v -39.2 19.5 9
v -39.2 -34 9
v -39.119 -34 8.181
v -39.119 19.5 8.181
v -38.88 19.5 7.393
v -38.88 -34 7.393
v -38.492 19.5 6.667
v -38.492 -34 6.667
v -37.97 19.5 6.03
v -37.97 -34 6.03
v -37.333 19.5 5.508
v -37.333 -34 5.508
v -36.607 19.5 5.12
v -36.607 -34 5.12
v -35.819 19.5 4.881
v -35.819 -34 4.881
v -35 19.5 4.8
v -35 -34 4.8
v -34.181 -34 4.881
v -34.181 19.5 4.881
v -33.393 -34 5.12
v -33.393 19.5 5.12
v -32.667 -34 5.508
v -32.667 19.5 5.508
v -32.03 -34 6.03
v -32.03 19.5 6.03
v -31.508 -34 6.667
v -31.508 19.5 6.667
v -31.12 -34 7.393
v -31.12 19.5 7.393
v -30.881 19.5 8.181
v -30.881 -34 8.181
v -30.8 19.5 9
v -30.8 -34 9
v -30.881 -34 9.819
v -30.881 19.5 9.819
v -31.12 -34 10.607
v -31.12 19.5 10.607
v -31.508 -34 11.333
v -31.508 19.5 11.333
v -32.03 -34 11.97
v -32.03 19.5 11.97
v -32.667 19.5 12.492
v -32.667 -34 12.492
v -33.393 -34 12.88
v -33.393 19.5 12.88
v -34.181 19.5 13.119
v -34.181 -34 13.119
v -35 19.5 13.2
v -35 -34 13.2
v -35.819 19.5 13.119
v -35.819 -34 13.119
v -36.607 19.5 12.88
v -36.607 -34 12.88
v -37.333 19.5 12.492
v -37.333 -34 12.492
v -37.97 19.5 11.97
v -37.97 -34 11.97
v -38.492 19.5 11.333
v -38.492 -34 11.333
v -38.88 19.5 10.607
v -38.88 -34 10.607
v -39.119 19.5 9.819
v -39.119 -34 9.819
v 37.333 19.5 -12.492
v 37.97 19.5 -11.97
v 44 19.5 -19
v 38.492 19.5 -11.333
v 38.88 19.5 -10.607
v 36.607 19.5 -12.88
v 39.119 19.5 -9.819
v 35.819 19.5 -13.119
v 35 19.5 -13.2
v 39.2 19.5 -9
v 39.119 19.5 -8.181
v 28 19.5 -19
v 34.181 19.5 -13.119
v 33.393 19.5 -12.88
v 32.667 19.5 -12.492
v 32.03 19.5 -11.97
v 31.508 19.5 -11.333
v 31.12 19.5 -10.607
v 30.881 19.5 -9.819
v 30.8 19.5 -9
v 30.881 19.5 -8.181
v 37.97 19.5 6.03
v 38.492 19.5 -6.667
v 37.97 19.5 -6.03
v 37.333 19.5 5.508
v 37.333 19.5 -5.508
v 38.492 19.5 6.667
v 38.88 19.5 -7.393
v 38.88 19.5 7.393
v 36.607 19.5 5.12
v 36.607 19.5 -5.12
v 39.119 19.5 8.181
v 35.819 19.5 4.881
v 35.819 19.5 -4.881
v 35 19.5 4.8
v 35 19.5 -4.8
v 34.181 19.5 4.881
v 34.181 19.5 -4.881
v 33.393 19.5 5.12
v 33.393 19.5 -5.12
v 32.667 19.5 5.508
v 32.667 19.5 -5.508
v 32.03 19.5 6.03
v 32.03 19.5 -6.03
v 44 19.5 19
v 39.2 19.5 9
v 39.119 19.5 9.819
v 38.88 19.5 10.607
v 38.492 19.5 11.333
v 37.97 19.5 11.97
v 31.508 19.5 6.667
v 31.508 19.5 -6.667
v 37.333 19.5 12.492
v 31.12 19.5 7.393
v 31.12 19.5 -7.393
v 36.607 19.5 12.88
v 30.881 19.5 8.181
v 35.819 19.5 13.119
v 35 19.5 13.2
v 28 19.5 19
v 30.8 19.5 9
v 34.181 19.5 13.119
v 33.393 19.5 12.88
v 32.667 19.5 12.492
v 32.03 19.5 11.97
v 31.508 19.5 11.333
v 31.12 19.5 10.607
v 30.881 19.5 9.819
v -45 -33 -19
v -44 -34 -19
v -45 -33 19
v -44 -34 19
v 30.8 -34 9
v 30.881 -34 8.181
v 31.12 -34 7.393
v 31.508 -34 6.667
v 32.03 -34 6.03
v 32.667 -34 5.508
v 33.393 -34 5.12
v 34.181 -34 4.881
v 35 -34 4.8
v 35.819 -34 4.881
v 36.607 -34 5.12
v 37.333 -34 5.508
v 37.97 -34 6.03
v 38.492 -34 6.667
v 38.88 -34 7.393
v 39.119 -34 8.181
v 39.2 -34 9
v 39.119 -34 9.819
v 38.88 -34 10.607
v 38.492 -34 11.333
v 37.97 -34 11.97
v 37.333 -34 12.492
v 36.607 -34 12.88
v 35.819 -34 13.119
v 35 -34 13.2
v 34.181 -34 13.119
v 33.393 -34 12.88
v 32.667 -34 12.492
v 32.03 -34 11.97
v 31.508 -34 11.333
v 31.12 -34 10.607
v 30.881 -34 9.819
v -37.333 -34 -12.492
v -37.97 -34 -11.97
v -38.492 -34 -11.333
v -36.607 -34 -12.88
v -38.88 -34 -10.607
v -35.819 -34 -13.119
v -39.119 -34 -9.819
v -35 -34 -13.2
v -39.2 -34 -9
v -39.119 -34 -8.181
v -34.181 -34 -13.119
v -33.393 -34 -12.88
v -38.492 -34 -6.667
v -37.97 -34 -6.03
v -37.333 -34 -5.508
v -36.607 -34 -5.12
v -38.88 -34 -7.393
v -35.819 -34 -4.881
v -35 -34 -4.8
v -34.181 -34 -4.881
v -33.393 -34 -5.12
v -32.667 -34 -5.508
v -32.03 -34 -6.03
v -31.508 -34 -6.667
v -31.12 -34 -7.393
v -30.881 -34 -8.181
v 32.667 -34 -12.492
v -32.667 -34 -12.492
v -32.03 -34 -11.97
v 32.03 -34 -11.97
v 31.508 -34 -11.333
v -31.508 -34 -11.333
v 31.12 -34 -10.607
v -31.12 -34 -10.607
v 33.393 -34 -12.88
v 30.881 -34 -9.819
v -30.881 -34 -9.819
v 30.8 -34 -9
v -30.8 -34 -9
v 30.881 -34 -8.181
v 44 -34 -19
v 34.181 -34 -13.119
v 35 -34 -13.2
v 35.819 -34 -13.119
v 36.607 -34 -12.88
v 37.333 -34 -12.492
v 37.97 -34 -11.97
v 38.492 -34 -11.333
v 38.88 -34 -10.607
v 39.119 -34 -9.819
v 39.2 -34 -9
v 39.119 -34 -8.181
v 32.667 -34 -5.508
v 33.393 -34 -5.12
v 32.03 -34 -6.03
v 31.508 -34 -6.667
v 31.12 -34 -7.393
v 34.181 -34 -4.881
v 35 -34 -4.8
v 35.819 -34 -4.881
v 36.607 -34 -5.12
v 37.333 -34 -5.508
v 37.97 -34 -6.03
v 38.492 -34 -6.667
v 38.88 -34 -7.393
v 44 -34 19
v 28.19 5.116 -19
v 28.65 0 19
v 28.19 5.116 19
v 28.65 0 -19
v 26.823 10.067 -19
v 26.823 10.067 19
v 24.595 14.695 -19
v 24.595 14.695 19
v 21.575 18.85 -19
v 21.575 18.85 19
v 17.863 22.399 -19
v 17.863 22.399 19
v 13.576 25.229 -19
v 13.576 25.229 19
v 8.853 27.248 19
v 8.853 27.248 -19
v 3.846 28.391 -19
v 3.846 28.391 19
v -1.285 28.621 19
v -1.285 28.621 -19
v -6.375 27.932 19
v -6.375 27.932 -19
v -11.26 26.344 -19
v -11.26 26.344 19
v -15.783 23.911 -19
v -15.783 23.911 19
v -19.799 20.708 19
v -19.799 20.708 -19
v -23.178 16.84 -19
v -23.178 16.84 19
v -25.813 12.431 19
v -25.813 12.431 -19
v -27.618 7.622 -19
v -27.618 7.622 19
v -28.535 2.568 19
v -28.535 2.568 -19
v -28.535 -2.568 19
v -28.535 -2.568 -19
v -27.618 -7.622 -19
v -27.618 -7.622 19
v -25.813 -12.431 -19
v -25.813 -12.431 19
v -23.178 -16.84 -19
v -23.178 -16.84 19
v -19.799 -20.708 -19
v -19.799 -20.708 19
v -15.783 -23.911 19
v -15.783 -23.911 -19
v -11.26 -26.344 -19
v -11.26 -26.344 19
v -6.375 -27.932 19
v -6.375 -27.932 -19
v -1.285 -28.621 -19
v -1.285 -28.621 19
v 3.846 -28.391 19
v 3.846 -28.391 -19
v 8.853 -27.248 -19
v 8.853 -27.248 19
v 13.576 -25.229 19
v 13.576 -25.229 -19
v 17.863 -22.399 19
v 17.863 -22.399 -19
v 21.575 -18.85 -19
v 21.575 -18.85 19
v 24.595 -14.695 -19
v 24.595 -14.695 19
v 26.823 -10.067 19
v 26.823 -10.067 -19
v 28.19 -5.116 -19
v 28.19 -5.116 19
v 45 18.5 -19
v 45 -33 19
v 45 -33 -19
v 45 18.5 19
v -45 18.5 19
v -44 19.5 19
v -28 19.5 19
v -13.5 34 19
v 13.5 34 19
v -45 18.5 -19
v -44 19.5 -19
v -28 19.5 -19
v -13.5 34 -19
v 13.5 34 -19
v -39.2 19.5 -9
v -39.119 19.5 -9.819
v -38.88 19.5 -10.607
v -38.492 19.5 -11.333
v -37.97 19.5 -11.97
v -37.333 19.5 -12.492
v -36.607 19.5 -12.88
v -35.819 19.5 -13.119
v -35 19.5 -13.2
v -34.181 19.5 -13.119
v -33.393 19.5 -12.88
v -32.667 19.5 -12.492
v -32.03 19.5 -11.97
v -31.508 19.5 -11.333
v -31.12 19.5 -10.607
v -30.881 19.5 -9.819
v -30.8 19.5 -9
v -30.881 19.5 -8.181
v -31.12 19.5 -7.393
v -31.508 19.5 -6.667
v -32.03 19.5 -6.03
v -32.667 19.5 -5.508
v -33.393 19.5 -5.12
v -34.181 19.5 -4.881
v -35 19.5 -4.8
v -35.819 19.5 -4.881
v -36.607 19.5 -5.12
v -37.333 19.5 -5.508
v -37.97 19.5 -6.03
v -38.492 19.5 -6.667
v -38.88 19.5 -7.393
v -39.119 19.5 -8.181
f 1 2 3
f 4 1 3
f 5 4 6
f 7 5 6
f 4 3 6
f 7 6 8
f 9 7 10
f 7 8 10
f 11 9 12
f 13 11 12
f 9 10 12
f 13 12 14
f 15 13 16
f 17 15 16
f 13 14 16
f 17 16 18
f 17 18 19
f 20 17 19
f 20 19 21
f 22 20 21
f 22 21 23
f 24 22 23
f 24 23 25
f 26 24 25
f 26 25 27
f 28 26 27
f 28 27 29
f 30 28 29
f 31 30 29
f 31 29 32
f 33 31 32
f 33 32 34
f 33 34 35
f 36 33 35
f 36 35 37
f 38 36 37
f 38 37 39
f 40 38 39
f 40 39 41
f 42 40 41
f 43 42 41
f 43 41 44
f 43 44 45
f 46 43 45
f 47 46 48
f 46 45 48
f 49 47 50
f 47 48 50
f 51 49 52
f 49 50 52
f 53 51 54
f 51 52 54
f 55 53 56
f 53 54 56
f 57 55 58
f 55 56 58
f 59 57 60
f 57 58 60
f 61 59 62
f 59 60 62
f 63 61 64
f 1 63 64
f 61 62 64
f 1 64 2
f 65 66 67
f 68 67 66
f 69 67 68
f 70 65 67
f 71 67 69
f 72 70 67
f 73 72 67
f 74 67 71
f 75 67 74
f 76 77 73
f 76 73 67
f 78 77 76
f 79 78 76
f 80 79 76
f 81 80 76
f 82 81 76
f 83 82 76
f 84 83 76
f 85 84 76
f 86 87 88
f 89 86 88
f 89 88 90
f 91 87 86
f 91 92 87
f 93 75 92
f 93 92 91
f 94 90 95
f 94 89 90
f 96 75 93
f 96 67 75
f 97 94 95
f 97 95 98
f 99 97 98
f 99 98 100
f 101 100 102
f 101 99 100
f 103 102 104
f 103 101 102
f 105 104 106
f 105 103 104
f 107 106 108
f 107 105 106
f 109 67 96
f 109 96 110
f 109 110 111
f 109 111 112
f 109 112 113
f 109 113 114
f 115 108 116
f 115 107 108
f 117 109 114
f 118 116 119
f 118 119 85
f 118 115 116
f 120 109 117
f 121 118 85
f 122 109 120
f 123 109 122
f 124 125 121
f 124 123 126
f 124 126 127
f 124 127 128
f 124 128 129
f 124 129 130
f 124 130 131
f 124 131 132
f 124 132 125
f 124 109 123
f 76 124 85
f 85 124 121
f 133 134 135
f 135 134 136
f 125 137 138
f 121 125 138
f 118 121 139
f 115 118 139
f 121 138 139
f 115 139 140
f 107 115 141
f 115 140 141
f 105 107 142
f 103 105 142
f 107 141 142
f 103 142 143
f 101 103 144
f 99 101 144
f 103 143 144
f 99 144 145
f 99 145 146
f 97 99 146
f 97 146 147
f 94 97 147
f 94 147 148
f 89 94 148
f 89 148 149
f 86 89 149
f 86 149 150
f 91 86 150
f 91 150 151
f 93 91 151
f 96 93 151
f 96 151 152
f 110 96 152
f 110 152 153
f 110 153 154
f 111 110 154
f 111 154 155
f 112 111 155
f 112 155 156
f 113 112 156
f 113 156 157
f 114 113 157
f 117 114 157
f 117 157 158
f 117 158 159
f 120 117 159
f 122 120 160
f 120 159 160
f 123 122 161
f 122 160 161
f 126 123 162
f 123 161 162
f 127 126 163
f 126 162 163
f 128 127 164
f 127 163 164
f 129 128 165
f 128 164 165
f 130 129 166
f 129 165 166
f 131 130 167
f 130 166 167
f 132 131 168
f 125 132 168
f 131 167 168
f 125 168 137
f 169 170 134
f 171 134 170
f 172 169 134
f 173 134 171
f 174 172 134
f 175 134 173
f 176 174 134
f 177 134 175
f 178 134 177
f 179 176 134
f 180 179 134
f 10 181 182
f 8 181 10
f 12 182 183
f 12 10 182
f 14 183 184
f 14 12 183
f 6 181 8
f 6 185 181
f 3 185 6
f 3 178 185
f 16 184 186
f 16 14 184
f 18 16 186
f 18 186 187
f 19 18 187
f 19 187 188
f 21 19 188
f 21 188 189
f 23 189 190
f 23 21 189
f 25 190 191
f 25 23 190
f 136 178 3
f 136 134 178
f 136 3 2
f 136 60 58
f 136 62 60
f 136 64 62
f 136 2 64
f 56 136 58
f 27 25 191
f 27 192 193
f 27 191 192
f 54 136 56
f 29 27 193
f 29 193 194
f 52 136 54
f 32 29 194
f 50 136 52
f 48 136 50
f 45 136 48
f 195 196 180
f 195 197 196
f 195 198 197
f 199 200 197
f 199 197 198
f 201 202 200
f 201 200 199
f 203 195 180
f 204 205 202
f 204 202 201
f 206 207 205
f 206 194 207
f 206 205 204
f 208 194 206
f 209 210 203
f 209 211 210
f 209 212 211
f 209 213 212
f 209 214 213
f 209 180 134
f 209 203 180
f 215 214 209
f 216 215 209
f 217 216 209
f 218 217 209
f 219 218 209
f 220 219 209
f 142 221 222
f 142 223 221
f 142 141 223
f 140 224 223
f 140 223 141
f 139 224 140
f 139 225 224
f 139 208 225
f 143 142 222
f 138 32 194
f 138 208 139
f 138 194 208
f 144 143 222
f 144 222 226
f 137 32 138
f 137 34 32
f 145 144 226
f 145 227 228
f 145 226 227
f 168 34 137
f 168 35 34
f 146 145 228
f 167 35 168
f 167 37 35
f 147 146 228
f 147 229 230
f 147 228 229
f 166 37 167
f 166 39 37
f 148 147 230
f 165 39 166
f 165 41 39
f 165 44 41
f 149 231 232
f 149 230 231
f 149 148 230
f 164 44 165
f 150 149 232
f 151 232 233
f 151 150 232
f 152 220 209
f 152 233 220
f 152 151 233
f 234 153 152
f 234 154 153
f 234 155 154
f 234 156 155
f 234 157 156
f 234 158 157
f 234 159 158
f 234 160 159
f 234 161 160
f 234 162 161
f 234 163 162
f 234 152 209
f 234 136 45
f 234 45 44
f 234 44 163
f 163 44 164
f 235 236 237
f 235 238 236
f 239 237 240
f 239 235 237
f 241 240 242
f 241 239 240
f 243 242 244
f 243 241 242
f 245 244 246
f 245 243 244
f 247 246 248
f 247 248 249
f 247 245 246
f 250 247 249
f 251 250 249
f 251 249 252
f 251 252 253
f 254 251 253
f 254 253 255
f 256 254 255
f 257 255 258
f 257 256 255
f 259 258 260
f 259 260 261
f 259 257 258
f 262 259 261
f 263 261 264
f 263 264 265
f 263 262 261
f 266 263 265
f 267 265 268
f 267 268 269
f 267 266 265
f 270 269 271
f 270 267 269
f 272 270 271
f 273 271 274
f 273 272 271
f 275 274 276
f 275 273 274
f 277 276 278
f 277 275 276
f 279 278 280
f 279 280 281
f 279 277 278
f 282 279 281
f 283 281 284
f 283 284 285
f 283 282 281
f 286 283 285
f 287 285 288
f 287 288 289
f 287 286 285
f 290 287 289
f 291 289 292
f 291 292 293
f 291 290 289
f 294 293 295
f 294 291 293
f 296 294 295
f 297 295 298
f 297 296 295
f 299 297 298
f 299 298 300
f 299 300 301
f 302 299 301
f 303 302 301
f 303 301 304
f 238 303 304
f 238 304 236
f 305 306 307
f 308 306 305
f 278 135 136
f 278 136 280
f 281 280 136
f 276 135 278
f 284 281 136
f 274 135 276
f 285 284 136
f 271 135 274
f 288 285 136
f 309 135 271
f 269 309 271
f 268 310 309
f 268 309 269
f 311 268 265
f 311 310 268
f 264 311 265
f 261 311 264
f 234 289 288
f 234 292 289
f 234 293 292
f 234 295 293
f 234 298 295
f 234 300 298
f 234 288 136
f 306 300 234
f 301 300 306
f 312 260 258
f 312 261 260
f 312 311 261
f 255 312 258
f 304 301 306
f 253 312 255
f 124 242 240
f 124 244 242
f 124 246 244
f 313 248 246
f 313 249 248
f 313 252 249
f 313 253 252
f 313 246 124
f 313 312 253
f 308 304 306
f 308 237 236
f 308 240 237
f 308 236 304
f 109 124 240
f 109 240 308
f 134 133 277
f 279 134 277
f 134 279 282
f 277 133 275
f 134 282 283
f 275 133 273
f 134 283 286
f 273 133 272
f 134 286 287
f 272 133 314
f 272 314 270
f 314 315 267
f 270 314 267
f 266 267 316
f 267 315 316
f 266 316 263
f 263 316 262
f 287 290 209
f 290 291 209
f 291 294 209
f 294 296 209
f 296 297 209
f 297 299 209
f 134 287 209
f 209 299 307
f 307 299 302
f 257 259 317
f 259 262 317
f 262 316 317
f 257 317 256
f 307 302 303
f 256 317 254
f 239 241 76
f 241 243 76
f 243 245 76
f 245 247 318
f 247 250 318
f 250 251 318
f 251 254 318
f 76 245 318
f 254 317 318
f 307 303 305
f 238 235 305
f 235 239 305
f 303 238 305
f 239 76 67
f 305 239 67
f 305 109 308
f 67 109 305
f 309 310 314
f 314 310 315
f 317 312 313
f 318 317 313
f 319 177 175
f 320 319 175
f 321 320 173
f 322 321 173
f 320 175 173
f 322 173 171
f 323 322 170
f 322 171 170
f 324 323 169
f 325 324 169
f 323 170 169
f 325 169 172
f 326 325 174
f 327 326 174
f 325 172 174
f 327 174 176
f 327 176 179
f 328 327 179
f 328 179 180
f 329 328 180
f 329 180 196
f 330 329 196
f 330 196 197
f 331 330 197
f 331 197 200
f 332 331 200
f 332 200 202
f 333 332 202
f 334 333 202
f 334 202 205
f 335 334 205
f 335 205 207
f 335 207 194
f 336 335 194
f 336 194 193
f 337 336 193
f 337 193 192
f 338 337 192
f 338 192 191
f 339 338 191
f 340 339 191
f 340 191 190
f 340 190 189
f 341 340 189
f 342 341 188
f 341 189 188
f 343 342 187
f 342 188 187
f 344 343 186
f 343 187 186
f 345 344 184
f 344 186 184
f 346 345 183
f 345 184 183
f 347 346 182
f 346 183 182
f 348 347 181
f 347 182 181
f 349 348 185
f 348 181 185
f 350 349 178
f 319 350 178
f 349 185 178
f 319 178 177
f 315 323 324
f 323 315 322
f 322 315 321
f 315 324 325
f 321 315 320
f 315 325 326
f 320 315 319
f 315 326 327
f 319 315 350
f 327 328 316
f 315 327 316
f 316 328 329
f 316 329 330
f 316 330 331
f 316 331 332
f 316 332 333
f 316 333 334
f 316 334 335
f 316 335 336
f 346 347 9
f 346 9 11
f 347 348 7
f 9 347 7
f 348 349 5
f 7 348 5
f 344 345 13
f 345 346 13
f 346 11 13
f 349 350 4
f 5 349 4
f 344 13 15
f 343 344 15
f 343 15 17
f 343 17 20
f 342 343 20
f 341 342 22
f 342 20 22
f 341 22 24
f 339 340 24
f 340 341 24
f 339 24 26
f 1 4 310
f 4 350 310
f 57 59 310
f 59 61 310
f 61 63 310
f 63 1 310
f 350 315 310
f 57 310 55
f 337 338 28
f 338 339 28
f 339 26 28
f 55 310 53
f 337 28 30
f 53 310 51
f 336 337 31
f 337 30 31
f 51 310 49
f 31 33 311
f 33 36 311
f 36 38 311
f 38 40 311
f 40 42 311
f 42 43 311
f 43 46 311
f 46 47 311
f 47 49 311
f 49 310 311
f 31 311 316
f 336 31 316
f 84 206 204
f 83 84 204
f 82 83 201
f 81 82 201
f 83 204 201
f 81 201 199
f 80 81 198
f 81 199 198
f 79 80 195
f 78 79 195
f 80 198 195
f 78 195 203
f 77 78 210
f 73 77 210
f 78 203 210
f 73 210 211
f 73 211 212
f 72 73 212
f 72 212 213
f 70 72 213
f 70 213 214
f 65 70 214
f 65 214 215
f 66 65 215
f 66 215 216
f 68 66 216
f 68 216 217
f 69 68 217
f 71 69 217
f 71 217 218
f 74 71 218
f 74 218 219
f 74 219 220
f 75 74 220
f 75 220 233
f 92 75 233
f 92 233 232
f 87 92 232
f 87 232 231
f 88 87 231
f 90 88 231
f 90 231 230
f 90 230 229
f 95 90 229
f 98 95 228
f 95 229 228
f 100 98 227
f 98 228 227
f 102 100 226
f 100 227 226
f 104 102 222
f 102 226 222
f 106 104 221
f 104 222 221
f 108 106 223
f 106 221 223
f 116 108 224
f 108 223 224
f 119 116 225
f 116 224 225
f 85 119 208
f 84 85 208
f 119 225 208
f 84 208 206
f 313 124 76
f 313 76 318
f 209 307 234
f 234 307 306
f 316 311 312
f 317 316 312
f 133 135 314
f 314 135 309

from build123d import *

# Parameters (mm, degrees)
SKETCH1_W            = 90
SKETCH1_H            = 68
SKETCH1_R            = 28.65
BOSS_EXTRUDE1_DEPTH  = 19
M8_CLEARANCE_HOLE1_D = 8.4
CUT_EXTRUDE2_DEPTH   = 39
CHAMFER1_SIZE        = 1


with BuildPart() as part:
    # Sketch1 → Boss-Extrude1 (new body, symmetric)
    with BuildSketch(Plane.XY):
        Rectangle(SKETCH1_W, SKETCH1_H)
        Circle(SKETCH1_R, mode=Mode.SUBTRACT)
    extrude(amount=BOSS_EXTRUDE1_DEPTH, both=True)

    # M8 Clearance Hole1 (through all)
    with Locations(Plane(origin=(0, 34, 0), x_dir=(1, 0, 0), z_dir=(0, 1, 0))):
        with Locations((-35, 9), (-35, -9), (35, -9), (35, 9)):
            Hole(M8_CLEARANCE_HOLE1_D / 2)

    # Sketch3 → Cut-Extrude2 (cut, through all)
    with BuildSketch(Plane.XY.offset(19)):
        Polygon((-45, 19.5), (-28, 19.5), (-13.5, 34), (-45, 34), align=None)
        Polygon((45, 19.5), (28, 19.5), (13.5, 34), (45, 34), align=None)
    extrude(amount=-CUT_EXTRUDE2_DEPTH, mode=Mode.SUBTRACT)

    # Chamfer1
    chamfer1_edges = [part.edges().sort_by_distance(p)[0] for p in [
        (-45, 19.5, 0),
        (45, 19.5, 0),
        (45, -34, 0),
        (-45, -34, 0),
    ]]
    chamfer(chamfer1_edges, length=CHAMFER1_SIZE)


solid = part.part
